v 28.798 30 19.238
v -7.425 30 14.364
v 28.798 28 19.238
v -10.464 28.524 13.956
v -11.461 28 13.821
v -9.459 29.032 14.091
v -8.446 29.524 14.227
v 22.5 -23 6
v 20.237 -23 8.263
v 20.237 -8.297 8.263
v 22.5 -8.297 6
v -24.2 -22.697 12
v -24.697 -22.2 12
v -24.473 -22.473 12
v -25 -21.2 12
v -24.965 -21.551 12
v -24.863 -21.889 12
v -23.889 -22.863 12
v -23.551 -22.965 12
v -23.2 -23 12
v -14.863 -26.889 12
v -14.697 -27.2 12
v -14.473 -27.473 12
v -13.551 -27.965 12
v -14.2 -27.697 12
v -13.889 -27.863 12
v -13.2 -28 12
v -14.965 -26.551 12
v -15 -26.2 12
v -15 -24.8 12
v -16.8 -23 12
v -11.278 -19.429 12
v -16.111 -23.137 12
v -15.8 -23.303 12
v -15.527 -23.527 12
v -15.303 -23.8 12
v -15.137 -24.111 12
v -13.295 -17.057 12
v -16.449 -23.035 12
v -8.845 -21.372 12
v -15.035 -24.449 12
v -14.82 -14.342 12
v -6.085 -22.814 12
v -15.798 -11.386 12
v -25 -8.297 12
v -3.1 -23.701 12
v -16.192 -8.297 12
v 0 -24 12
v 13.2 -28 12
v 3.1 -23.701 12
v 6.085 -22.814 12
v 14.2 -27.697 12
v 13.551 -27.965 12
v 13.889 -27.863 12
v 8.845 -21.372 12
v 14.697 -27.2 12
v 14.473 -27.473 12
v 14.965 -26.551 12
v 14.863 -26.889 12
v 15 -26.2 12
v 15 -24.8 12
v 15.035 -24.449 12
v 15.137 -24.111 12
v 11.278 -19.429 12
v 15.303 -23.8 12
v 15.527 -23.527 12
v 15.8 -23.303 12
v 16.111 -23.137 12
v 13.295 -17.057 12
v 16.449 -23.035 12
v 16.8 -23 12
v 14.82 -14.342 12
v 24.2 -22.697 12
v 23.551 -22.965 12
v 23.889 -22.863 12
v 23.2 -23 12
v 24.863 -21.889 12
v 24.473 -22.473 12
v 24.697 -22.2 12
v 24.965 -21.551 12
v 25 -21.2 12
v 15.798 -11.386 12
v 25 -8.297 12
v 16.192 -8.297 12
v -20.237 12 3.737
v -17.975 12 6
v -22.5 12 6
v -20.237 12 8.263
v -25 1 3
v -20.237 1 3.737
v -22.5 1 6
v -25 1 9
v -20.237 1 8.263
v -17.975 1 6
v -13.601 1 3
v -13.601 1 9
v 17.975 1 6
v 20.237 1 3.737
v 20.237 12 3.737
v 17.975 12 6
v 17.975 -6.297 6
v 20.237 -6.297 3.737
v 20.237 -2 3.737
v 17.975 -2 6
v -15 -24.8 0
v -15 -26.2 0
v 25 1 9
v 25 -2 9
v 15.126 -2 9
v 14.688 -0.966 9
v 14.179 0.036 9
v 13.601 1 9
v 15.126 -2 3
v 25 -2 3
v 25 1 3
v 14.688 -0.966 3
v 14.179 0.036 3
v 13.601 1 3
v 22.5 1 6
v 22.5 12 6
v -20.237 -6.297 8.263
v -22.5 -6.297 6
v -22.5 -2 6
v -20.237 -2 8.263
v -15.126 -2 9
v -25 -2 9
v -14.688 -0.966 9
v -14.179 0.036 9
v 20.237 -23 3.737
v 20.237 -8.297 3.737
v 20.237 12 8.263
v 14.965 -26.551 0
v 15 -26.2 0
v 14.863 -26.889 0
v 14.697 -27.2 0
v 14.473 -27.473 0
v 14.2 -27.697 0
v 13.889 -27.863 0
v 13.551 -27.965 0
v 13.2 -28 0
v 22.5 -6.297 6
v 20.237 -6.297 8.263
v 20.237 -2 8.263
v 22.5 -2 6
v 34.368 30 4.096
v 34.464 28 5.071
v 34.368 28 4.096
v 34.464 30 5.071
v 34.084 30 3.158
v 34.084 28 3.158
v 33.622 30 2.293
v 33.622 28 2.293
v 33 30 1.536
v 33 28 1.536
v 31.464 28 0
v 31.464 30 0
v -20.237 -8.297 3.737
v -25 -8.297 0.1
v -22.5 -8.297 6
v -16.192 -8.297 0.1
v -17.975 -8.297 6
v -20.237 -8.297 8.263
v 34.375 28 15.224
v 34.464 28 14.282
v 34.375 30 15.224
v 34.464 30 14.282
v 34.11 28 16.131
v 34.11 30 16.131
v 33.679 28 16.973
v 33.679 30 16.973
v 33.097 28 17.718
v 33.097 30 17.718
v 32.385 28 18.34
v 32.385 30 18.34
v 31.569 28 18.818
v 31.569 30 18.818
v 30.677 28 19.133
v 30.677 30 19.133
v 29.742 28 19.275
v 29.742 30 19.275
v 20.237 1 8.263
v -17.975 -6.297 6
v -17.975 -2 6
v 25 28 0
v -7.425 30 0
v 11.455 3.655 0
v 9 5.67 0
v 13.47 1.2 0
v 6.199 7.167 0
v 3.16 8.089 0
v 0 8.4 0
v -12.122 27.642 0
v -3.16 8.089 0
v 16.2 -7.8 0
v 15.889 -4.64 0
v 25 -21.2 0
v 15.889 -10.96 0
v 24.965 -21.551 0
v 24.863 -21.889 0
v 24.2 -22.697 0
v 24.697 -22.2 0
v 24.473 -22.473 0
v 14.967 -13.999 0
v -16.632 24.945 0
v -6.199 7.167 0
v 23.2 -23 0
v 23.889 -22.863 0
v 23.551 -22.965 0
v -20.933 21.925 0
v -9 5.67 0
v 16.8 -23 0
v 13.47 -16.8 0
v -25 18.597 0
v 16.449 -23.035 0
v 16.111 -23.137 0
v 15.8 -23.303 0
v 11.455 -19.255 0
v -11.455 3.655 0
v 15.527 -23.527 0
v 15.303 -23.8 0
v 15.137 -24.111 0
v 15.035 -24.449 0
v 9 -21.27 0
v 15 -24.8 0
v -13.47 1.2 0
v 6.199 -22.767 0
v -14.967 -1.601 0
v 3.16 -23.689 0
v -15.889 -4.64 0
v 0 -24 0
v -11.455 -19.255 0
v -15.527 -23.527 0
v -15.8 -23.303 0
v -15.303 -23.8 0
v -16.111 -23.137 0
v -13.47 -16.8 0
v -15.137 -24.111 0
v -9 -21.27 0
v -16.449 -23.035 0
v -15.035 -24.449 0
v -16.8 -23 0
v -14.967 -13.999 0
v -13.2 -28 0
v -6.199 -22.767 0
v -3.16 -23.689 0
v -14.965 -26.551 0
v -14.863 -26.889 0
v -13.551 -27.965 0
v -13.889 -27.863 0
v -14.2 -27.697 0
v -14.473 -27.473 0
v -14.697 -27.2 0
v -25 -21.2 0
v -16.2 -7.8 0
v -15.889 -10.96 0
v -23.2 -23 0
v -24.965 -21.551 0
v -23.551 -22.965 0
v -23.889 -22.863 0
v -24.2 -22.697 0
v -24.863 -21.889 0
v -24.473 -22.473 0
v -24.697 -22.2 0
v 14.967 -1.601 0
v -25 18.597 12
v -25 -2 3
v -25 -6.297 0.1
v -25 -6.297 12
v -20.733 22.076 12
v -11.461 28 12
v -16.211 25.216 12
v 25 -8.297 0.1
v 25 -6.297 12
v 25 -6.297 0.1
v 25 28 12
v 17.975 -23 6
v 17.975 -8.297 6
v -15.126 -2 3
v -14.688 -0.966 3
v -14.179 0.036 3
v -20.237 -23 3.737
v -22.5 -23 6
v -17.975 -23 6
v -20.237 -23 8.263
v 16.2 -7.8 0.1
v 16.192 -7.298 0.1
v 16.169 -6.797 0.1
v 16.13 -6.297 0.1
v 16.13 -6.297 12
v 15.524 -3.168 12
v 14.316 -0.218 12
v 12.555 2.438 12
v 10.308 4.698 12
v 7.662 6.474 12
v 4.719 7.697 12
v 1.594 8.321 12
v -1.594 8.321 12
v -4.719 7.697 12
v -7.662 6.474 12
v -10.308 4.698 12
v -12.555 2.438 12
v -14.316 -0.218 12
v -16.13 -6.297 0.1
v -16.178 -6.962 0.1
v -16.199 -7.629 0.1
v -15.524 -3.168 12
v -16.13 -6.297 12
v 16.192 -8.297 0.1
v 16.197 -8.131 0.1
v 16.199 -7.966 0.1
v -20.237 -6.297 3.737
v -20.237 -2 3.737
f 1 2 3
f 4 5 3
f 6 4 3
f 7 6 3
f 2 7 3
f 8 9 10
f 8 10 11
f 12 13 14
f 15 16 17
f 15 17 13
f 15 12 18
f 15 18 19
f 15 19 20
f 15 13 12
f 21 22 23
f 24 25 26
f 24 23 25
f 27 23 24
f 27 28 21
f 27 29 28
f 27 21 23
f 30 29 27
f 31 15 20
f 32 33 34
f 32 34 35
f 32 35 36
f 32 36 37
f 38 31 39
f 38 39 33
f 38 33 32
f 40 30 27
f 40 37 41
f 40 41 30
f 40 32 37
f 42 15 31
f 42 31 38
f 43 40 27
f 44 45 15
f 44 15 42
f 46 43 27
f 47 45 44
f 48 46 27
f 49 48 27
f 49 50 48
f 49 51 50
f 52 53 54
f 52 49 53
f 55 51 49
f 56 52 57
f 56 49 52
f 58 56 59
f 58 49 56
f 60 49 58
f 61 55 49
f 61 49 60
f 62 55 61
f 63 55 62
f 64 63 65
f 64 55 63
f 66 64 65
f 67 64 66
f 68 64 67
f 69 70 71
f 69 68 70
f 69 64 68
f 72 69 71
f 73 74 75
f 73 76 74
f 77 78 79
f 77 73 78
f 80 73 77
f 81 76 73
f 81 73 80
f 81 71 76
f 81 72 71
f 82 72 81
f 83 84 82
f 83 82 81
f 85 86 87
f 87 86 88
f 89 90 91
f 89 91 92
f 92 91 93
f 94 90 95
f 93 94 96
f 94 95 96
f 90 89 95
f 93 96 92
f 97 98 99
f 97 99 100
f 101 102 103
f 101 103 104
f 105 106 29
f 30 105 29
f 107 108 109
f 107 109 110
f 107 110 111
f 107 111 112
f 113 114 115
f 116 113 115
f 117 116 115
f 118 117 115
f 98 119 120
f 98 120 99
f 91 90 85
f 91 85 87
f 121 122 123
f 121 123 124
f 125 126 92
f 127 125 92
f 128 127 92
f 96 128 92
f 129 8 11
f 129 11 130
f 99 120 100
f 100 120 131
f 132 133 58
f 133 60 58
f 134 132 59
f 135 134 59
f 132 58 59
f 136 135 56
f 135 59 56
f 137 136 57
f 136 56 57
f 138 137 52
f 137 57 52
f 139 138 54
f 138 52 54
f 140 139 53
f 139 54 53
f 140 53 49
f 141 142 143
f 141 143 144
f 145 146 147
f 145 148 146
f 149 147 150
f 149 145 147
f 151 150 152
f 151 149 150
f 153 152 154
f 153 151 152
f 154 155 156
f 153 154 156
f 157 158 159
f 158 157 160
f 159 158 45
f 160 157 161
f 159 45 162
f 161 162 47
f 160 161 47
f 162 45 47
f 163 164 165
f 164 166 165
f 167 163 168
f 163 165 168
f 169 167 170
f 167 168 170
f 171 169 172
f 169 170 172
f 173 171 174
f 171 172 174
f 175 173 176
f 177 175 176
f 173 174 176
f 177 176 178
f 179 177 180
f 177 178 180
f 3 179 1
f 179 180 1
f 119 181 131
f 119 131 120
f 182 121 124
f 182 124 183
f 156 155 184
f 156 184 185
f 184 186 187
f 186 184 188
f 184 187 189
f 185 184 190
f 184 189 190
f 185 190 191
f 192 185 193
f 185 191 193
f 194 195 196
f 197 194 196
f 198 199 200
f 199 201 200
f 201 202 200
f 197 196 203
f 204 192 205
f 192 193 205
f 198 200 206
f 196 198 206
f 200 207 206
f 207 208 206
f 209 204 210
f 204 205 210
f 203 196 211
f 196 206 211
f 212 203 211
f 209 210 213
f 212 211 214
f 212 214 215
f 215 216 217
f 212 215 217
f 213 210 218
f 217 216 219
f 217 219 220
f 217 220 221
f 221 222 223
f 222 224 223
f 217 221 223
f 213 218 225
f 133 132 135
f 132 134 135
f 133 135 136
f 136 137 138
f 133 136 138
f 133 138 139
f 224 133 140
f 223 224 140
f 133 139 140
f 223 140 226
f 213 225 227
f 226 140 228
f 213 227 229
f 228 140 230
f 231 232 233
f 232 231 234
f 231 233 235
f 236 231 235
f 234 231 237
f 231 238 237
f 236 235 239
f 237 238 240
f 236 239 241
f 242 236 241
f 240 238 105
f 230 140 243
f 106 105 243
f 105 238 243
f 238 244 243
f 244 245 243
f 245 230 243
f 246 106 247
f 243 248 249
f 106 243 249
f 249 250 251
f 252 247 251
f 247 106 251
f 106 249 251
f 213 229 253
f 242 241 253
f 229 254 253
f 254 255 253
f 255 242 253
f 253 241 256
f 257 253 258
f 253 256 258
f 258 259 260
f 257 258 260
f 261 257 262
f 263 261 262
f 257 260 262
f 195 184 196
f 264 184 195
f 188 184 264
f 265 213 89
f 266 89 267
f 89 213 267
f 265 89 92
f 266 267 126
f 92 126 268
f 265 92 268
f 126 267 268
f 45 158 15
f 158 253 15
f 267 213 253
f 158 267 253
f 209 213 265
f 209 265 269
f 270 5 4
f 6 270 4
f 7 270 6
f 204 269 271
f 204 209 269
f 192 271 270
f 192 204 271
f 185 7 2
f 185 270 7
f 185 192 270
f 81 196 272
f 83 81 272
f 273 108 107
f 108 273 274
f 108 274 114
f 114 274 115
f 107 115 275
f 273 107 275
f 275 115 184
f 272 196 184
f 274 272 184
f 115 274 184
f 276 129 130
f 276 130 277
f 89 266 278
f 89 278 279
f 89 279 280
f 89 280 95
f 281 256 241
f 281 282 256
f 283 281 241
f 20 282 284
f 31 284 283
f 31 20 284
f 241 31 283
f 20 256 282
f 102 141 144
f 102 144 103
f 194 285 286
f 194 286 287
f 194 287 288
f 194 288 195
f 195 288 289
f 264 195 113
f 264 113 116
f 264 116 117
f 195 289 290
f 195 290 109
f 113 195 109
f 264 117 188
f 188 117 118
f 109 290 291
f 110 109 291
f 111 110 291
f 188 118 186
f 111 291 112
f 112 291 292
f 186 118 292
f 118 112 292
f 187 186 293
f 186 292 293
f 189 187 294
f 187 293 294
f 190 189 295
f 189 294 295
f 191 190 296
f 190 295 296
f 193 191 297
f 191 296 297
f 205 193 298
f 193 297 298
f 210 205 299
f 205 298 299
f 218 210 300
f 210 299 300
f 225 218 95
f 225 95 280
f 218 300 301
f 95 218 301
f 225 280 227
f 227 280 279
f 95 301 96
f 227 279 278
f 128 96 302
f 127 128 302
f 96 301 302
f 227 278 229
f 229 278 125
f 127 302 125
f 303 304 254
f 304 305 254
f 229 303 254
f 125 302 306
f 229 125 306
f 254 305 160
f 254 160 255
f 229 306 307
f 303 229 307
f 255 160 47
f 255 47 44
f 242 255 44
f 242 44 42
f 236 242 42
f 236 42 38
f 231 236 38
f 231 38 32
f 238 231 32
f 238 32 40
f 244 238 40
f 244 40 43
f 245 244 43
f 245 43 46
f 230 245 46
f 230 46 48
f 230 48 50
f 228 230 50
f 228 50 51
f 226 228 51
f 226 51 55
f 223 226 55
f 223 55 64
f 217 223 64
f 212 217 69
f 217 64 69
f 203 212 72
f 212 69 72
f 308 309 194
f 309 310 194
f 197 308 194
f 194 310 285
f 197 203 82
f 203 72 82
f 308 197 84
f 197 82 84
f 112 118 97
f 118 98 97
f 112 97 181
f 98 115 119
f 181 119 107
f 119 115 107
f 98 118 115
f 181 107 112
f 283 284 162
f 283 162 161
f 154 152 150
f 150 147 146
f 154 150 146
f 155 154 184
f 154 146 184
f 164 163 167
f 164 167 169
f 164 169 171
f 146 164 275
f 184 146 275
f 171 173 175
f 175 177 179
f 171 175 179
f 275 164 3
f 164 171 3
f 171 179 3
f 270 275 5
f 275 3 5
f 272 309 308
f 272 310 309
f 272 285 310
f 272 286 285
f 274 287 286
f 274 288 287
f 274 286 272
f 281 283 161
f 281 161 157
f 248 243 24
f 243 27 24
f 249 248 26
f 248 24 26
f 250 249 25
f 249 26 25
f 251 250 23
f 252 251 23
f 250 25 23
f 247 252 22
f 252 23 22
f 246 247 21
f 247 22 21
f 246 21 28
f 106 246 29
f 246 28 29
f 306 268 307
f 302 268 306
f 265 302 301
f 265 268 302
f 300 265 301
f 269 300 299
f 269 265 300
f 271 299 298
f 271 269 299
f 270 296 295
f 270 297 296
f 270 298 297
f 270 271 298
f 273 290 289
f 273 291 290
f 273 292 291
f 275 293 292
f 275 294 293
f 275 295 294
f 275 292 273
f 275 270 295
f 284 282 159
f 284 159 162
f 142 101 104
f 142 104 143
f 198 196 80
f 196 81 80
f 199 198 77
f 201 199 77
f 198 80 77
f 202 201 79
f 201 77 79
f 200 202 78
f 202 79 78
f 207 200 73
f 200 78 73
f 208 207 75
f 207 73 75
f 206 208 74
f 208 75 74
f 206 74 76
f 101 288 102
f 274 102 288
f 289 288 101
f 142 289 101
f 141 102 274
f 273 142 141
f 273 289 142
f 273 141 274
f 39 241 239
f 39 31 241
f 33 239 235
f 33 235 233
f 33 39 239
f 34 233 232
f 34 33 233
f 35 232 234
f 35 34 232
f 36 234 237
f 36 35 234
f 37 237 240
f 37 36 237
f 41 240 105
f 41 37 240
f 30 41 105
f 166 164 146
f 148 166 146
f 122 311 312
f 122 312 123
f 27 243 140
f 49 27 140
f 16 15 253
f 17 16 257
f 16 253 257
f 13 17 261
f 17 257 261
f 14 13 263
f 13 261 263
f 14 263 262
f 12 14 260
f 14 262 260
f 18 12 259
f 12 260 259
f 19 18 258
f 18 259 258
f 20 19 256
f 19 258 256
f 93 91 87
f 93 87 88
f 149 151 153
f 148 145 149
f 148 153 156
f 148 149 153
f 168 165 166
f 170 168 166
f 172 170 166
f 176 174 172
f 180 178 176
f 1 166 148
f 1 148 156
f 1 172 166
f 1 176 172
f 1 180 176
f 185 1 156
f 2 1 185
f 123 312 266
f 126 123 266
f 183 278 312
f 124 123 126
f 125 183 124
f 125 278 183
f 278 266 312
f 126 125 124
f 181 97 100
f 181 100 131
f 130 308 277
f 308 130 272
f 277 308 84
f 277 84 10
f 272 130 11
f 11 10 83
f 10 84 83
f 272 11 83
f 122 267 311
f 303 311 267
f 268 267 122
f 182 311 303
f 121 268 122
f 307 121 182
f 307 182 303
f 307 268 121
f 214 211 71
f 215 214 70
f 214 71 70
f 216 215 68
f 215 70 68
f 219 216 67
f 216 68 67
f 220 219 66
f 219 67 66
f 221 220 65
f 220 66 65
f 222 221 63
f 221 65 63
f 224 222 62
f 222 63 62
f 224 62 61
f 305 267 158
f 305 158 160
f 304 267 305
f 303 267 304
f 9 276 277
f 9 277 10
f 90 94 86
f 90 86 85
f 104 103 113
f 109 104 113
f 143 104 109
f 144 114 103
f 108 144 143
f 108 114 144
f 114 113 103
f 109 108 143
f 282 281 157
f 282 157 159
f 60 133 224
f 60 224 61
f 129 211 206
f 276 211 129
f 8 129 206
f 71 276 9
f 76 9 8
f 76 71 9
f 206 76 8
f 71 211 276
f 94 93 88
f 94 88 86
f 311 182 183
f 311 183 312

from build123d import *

# Parameters (mm, degrees)
SKETCH_W        = 50
SKETCH_H        = 56
PAD_DEPTH       = 12
SKETCH001_R     = 16.2
POCKET_DEPTH    = 12.001
PAD001_DEPTH    = 2
SKETCH004_W     = 72.31723
SKETCH004_H     = 2
POCKET001_DEPTH = 11.9
SKETCH005_W     = 25.040878
SKETCH005_H     = 17.68627
SKETCH005_W_2   = 12.208063
SKETCH005_H_2   = 50.590956
POCKET002_DEPTH = 5
SKETCH003_W     = 3
SKETCH003_H     = 6
POCKET003_DEPTH = 50.001
POCKET004_DEPTH = 35
FILLET_R        = 1.8
POCKET005_DEPTH = 20.001
CHAMFER_SIZE    = 3
FILLET001_R     = 5
FILLET002_R     = 5


with BuildPart() as part:
    # Sketch → Pad (new body)
    with BuildSketch(Plane.XY):
        Rectangle(SKETCH_W, SKETCH_H)
    extrude(amount=PAD_DEPTH)

    # Sketch001 → Pocket (cut, through all)
    with BuildSketch(Plane.XY.offset(12)):
        with Locations((0, -7.8)):
            Circle(SKETCH001_R)
    extrude(amount=-POCKET_DEPTH, mode=Mode.SUBTRACT)

    # Sketch009 → Pad001 (new body)
    with BuildSketch(Plane(origin=(0, 28, 0), x_dir=(-1, 0, 0), z_dir=(0, 1, 0))):
        Polygon((25, 12), (-34.464275, 20), (-34.464275, 0), (25, 0), align=None)
    extrude(amount=PAD001_DEPTH)

    # Sketch004 → Pocket001 (cut)
    with BuildSketch(Plane.XY.offset(12)):
        with Locations((-0.55157, -7.296643)):
            Rectangle(SKETCH004_W, SKETCH004_H)
    extrude(amount=-POCKET001_DEPTH, mode=Mode.SUBTRACT)

    # Sketch005 → Pocket002 (cut)
    with BuildSketch(Plane.XZ.offset(28)):
        with Locations((-27.520439, 4.662494)):
            Rectangle(SKETCH005_W, SKETCH005_H)
        with Locations((21.104031, -3.872155)):
            Rectangle(SKETCH005_W_2, SKETCH005_H_2)
    extrude(amount=-POCKET002_DEPTH, mode=Mode.SUBTRACT)

    # Sketch003 → Pocket003 (cut, through all)
    with BuildSketch(Plane.YZ.offset(25)):
        with Locations((-0.5, 6)):
            Rectangle(SKETCH003_W, SKETCH003_H)
    extrude(amount=-POCKET003_DEPTH, mode=Mode.SUBTRACT)

    # Sketch002 → Pocket004 (cut)
    with BuildSketch(Plane.XZ.offset(23)):
        Polygon((-22.5, 6), (-20.237258, 8.262742), (-17.974517, 6), (-20.237258, 3.737258), align=None)
        Polygon((17.974517, 6), (20.237258, 8.262742), (22.5, 6), (20.237258, 3.737258), align=None)
    extrude(amount=-POCKET004_DEPTH, mode=Mode.SUBTRACT)

    # Fillet
    fillet_edges = [part.edges().sort_by_distance(p)[0] for p in [
        (15, -28, 6),
        (15, -23, 6),
        (25, -23, 6),
        (-15, -28, 6),
        (-15, -23, 6),
        (-25, -23, 6),
    ]]
    fillet(fillet_edges, radius=FILLET_R)

    # Sketch010 → Pocket005 (cut, through all)
    with BuildSketch(Plane(origin=(0, 0, 0), x_dir=(1, 0, 0), z_dir=(0, 0, -1))):
        with BuildLine():
            ThreePointArc((-35.356641, -7.272038), (-13.77578, -26.704891), (13.751946, -35.956576))
            Line((13.751946, -35.956576), (-64.830559, -41.48777))
            Line((-64.830559, -41.48777), (-35.356641, -7.272038))
        make_face()
    extrude(amount=-POCKET005_DEPTH, mode=Mode.SUBTRACT)

    # Chamfer
    chamfer_edges = [part.edges().sort_by_distance(p)[0] for p in [
        (34.464275, 29, 0),
    ]]
    chamfer(chamfer_edges, length=CHAMFER_SIZE)

    # Fillet001
    fillet001_edges = [part.edges().sort_by_distance(p)[0] for p in [
        (34.464275, 29, 20),
    ]]
    fillet(fillet001_edges, radius=FILLET001_R)

    # Fillet002
    fillet002_edges = [part.edges().sort_by_distance(p)[0] for p in [
        (34.464275, 29, 3),
    ]]
    fillet(fillet002_edges, radius=FILLET002_R)


solid = part.part
